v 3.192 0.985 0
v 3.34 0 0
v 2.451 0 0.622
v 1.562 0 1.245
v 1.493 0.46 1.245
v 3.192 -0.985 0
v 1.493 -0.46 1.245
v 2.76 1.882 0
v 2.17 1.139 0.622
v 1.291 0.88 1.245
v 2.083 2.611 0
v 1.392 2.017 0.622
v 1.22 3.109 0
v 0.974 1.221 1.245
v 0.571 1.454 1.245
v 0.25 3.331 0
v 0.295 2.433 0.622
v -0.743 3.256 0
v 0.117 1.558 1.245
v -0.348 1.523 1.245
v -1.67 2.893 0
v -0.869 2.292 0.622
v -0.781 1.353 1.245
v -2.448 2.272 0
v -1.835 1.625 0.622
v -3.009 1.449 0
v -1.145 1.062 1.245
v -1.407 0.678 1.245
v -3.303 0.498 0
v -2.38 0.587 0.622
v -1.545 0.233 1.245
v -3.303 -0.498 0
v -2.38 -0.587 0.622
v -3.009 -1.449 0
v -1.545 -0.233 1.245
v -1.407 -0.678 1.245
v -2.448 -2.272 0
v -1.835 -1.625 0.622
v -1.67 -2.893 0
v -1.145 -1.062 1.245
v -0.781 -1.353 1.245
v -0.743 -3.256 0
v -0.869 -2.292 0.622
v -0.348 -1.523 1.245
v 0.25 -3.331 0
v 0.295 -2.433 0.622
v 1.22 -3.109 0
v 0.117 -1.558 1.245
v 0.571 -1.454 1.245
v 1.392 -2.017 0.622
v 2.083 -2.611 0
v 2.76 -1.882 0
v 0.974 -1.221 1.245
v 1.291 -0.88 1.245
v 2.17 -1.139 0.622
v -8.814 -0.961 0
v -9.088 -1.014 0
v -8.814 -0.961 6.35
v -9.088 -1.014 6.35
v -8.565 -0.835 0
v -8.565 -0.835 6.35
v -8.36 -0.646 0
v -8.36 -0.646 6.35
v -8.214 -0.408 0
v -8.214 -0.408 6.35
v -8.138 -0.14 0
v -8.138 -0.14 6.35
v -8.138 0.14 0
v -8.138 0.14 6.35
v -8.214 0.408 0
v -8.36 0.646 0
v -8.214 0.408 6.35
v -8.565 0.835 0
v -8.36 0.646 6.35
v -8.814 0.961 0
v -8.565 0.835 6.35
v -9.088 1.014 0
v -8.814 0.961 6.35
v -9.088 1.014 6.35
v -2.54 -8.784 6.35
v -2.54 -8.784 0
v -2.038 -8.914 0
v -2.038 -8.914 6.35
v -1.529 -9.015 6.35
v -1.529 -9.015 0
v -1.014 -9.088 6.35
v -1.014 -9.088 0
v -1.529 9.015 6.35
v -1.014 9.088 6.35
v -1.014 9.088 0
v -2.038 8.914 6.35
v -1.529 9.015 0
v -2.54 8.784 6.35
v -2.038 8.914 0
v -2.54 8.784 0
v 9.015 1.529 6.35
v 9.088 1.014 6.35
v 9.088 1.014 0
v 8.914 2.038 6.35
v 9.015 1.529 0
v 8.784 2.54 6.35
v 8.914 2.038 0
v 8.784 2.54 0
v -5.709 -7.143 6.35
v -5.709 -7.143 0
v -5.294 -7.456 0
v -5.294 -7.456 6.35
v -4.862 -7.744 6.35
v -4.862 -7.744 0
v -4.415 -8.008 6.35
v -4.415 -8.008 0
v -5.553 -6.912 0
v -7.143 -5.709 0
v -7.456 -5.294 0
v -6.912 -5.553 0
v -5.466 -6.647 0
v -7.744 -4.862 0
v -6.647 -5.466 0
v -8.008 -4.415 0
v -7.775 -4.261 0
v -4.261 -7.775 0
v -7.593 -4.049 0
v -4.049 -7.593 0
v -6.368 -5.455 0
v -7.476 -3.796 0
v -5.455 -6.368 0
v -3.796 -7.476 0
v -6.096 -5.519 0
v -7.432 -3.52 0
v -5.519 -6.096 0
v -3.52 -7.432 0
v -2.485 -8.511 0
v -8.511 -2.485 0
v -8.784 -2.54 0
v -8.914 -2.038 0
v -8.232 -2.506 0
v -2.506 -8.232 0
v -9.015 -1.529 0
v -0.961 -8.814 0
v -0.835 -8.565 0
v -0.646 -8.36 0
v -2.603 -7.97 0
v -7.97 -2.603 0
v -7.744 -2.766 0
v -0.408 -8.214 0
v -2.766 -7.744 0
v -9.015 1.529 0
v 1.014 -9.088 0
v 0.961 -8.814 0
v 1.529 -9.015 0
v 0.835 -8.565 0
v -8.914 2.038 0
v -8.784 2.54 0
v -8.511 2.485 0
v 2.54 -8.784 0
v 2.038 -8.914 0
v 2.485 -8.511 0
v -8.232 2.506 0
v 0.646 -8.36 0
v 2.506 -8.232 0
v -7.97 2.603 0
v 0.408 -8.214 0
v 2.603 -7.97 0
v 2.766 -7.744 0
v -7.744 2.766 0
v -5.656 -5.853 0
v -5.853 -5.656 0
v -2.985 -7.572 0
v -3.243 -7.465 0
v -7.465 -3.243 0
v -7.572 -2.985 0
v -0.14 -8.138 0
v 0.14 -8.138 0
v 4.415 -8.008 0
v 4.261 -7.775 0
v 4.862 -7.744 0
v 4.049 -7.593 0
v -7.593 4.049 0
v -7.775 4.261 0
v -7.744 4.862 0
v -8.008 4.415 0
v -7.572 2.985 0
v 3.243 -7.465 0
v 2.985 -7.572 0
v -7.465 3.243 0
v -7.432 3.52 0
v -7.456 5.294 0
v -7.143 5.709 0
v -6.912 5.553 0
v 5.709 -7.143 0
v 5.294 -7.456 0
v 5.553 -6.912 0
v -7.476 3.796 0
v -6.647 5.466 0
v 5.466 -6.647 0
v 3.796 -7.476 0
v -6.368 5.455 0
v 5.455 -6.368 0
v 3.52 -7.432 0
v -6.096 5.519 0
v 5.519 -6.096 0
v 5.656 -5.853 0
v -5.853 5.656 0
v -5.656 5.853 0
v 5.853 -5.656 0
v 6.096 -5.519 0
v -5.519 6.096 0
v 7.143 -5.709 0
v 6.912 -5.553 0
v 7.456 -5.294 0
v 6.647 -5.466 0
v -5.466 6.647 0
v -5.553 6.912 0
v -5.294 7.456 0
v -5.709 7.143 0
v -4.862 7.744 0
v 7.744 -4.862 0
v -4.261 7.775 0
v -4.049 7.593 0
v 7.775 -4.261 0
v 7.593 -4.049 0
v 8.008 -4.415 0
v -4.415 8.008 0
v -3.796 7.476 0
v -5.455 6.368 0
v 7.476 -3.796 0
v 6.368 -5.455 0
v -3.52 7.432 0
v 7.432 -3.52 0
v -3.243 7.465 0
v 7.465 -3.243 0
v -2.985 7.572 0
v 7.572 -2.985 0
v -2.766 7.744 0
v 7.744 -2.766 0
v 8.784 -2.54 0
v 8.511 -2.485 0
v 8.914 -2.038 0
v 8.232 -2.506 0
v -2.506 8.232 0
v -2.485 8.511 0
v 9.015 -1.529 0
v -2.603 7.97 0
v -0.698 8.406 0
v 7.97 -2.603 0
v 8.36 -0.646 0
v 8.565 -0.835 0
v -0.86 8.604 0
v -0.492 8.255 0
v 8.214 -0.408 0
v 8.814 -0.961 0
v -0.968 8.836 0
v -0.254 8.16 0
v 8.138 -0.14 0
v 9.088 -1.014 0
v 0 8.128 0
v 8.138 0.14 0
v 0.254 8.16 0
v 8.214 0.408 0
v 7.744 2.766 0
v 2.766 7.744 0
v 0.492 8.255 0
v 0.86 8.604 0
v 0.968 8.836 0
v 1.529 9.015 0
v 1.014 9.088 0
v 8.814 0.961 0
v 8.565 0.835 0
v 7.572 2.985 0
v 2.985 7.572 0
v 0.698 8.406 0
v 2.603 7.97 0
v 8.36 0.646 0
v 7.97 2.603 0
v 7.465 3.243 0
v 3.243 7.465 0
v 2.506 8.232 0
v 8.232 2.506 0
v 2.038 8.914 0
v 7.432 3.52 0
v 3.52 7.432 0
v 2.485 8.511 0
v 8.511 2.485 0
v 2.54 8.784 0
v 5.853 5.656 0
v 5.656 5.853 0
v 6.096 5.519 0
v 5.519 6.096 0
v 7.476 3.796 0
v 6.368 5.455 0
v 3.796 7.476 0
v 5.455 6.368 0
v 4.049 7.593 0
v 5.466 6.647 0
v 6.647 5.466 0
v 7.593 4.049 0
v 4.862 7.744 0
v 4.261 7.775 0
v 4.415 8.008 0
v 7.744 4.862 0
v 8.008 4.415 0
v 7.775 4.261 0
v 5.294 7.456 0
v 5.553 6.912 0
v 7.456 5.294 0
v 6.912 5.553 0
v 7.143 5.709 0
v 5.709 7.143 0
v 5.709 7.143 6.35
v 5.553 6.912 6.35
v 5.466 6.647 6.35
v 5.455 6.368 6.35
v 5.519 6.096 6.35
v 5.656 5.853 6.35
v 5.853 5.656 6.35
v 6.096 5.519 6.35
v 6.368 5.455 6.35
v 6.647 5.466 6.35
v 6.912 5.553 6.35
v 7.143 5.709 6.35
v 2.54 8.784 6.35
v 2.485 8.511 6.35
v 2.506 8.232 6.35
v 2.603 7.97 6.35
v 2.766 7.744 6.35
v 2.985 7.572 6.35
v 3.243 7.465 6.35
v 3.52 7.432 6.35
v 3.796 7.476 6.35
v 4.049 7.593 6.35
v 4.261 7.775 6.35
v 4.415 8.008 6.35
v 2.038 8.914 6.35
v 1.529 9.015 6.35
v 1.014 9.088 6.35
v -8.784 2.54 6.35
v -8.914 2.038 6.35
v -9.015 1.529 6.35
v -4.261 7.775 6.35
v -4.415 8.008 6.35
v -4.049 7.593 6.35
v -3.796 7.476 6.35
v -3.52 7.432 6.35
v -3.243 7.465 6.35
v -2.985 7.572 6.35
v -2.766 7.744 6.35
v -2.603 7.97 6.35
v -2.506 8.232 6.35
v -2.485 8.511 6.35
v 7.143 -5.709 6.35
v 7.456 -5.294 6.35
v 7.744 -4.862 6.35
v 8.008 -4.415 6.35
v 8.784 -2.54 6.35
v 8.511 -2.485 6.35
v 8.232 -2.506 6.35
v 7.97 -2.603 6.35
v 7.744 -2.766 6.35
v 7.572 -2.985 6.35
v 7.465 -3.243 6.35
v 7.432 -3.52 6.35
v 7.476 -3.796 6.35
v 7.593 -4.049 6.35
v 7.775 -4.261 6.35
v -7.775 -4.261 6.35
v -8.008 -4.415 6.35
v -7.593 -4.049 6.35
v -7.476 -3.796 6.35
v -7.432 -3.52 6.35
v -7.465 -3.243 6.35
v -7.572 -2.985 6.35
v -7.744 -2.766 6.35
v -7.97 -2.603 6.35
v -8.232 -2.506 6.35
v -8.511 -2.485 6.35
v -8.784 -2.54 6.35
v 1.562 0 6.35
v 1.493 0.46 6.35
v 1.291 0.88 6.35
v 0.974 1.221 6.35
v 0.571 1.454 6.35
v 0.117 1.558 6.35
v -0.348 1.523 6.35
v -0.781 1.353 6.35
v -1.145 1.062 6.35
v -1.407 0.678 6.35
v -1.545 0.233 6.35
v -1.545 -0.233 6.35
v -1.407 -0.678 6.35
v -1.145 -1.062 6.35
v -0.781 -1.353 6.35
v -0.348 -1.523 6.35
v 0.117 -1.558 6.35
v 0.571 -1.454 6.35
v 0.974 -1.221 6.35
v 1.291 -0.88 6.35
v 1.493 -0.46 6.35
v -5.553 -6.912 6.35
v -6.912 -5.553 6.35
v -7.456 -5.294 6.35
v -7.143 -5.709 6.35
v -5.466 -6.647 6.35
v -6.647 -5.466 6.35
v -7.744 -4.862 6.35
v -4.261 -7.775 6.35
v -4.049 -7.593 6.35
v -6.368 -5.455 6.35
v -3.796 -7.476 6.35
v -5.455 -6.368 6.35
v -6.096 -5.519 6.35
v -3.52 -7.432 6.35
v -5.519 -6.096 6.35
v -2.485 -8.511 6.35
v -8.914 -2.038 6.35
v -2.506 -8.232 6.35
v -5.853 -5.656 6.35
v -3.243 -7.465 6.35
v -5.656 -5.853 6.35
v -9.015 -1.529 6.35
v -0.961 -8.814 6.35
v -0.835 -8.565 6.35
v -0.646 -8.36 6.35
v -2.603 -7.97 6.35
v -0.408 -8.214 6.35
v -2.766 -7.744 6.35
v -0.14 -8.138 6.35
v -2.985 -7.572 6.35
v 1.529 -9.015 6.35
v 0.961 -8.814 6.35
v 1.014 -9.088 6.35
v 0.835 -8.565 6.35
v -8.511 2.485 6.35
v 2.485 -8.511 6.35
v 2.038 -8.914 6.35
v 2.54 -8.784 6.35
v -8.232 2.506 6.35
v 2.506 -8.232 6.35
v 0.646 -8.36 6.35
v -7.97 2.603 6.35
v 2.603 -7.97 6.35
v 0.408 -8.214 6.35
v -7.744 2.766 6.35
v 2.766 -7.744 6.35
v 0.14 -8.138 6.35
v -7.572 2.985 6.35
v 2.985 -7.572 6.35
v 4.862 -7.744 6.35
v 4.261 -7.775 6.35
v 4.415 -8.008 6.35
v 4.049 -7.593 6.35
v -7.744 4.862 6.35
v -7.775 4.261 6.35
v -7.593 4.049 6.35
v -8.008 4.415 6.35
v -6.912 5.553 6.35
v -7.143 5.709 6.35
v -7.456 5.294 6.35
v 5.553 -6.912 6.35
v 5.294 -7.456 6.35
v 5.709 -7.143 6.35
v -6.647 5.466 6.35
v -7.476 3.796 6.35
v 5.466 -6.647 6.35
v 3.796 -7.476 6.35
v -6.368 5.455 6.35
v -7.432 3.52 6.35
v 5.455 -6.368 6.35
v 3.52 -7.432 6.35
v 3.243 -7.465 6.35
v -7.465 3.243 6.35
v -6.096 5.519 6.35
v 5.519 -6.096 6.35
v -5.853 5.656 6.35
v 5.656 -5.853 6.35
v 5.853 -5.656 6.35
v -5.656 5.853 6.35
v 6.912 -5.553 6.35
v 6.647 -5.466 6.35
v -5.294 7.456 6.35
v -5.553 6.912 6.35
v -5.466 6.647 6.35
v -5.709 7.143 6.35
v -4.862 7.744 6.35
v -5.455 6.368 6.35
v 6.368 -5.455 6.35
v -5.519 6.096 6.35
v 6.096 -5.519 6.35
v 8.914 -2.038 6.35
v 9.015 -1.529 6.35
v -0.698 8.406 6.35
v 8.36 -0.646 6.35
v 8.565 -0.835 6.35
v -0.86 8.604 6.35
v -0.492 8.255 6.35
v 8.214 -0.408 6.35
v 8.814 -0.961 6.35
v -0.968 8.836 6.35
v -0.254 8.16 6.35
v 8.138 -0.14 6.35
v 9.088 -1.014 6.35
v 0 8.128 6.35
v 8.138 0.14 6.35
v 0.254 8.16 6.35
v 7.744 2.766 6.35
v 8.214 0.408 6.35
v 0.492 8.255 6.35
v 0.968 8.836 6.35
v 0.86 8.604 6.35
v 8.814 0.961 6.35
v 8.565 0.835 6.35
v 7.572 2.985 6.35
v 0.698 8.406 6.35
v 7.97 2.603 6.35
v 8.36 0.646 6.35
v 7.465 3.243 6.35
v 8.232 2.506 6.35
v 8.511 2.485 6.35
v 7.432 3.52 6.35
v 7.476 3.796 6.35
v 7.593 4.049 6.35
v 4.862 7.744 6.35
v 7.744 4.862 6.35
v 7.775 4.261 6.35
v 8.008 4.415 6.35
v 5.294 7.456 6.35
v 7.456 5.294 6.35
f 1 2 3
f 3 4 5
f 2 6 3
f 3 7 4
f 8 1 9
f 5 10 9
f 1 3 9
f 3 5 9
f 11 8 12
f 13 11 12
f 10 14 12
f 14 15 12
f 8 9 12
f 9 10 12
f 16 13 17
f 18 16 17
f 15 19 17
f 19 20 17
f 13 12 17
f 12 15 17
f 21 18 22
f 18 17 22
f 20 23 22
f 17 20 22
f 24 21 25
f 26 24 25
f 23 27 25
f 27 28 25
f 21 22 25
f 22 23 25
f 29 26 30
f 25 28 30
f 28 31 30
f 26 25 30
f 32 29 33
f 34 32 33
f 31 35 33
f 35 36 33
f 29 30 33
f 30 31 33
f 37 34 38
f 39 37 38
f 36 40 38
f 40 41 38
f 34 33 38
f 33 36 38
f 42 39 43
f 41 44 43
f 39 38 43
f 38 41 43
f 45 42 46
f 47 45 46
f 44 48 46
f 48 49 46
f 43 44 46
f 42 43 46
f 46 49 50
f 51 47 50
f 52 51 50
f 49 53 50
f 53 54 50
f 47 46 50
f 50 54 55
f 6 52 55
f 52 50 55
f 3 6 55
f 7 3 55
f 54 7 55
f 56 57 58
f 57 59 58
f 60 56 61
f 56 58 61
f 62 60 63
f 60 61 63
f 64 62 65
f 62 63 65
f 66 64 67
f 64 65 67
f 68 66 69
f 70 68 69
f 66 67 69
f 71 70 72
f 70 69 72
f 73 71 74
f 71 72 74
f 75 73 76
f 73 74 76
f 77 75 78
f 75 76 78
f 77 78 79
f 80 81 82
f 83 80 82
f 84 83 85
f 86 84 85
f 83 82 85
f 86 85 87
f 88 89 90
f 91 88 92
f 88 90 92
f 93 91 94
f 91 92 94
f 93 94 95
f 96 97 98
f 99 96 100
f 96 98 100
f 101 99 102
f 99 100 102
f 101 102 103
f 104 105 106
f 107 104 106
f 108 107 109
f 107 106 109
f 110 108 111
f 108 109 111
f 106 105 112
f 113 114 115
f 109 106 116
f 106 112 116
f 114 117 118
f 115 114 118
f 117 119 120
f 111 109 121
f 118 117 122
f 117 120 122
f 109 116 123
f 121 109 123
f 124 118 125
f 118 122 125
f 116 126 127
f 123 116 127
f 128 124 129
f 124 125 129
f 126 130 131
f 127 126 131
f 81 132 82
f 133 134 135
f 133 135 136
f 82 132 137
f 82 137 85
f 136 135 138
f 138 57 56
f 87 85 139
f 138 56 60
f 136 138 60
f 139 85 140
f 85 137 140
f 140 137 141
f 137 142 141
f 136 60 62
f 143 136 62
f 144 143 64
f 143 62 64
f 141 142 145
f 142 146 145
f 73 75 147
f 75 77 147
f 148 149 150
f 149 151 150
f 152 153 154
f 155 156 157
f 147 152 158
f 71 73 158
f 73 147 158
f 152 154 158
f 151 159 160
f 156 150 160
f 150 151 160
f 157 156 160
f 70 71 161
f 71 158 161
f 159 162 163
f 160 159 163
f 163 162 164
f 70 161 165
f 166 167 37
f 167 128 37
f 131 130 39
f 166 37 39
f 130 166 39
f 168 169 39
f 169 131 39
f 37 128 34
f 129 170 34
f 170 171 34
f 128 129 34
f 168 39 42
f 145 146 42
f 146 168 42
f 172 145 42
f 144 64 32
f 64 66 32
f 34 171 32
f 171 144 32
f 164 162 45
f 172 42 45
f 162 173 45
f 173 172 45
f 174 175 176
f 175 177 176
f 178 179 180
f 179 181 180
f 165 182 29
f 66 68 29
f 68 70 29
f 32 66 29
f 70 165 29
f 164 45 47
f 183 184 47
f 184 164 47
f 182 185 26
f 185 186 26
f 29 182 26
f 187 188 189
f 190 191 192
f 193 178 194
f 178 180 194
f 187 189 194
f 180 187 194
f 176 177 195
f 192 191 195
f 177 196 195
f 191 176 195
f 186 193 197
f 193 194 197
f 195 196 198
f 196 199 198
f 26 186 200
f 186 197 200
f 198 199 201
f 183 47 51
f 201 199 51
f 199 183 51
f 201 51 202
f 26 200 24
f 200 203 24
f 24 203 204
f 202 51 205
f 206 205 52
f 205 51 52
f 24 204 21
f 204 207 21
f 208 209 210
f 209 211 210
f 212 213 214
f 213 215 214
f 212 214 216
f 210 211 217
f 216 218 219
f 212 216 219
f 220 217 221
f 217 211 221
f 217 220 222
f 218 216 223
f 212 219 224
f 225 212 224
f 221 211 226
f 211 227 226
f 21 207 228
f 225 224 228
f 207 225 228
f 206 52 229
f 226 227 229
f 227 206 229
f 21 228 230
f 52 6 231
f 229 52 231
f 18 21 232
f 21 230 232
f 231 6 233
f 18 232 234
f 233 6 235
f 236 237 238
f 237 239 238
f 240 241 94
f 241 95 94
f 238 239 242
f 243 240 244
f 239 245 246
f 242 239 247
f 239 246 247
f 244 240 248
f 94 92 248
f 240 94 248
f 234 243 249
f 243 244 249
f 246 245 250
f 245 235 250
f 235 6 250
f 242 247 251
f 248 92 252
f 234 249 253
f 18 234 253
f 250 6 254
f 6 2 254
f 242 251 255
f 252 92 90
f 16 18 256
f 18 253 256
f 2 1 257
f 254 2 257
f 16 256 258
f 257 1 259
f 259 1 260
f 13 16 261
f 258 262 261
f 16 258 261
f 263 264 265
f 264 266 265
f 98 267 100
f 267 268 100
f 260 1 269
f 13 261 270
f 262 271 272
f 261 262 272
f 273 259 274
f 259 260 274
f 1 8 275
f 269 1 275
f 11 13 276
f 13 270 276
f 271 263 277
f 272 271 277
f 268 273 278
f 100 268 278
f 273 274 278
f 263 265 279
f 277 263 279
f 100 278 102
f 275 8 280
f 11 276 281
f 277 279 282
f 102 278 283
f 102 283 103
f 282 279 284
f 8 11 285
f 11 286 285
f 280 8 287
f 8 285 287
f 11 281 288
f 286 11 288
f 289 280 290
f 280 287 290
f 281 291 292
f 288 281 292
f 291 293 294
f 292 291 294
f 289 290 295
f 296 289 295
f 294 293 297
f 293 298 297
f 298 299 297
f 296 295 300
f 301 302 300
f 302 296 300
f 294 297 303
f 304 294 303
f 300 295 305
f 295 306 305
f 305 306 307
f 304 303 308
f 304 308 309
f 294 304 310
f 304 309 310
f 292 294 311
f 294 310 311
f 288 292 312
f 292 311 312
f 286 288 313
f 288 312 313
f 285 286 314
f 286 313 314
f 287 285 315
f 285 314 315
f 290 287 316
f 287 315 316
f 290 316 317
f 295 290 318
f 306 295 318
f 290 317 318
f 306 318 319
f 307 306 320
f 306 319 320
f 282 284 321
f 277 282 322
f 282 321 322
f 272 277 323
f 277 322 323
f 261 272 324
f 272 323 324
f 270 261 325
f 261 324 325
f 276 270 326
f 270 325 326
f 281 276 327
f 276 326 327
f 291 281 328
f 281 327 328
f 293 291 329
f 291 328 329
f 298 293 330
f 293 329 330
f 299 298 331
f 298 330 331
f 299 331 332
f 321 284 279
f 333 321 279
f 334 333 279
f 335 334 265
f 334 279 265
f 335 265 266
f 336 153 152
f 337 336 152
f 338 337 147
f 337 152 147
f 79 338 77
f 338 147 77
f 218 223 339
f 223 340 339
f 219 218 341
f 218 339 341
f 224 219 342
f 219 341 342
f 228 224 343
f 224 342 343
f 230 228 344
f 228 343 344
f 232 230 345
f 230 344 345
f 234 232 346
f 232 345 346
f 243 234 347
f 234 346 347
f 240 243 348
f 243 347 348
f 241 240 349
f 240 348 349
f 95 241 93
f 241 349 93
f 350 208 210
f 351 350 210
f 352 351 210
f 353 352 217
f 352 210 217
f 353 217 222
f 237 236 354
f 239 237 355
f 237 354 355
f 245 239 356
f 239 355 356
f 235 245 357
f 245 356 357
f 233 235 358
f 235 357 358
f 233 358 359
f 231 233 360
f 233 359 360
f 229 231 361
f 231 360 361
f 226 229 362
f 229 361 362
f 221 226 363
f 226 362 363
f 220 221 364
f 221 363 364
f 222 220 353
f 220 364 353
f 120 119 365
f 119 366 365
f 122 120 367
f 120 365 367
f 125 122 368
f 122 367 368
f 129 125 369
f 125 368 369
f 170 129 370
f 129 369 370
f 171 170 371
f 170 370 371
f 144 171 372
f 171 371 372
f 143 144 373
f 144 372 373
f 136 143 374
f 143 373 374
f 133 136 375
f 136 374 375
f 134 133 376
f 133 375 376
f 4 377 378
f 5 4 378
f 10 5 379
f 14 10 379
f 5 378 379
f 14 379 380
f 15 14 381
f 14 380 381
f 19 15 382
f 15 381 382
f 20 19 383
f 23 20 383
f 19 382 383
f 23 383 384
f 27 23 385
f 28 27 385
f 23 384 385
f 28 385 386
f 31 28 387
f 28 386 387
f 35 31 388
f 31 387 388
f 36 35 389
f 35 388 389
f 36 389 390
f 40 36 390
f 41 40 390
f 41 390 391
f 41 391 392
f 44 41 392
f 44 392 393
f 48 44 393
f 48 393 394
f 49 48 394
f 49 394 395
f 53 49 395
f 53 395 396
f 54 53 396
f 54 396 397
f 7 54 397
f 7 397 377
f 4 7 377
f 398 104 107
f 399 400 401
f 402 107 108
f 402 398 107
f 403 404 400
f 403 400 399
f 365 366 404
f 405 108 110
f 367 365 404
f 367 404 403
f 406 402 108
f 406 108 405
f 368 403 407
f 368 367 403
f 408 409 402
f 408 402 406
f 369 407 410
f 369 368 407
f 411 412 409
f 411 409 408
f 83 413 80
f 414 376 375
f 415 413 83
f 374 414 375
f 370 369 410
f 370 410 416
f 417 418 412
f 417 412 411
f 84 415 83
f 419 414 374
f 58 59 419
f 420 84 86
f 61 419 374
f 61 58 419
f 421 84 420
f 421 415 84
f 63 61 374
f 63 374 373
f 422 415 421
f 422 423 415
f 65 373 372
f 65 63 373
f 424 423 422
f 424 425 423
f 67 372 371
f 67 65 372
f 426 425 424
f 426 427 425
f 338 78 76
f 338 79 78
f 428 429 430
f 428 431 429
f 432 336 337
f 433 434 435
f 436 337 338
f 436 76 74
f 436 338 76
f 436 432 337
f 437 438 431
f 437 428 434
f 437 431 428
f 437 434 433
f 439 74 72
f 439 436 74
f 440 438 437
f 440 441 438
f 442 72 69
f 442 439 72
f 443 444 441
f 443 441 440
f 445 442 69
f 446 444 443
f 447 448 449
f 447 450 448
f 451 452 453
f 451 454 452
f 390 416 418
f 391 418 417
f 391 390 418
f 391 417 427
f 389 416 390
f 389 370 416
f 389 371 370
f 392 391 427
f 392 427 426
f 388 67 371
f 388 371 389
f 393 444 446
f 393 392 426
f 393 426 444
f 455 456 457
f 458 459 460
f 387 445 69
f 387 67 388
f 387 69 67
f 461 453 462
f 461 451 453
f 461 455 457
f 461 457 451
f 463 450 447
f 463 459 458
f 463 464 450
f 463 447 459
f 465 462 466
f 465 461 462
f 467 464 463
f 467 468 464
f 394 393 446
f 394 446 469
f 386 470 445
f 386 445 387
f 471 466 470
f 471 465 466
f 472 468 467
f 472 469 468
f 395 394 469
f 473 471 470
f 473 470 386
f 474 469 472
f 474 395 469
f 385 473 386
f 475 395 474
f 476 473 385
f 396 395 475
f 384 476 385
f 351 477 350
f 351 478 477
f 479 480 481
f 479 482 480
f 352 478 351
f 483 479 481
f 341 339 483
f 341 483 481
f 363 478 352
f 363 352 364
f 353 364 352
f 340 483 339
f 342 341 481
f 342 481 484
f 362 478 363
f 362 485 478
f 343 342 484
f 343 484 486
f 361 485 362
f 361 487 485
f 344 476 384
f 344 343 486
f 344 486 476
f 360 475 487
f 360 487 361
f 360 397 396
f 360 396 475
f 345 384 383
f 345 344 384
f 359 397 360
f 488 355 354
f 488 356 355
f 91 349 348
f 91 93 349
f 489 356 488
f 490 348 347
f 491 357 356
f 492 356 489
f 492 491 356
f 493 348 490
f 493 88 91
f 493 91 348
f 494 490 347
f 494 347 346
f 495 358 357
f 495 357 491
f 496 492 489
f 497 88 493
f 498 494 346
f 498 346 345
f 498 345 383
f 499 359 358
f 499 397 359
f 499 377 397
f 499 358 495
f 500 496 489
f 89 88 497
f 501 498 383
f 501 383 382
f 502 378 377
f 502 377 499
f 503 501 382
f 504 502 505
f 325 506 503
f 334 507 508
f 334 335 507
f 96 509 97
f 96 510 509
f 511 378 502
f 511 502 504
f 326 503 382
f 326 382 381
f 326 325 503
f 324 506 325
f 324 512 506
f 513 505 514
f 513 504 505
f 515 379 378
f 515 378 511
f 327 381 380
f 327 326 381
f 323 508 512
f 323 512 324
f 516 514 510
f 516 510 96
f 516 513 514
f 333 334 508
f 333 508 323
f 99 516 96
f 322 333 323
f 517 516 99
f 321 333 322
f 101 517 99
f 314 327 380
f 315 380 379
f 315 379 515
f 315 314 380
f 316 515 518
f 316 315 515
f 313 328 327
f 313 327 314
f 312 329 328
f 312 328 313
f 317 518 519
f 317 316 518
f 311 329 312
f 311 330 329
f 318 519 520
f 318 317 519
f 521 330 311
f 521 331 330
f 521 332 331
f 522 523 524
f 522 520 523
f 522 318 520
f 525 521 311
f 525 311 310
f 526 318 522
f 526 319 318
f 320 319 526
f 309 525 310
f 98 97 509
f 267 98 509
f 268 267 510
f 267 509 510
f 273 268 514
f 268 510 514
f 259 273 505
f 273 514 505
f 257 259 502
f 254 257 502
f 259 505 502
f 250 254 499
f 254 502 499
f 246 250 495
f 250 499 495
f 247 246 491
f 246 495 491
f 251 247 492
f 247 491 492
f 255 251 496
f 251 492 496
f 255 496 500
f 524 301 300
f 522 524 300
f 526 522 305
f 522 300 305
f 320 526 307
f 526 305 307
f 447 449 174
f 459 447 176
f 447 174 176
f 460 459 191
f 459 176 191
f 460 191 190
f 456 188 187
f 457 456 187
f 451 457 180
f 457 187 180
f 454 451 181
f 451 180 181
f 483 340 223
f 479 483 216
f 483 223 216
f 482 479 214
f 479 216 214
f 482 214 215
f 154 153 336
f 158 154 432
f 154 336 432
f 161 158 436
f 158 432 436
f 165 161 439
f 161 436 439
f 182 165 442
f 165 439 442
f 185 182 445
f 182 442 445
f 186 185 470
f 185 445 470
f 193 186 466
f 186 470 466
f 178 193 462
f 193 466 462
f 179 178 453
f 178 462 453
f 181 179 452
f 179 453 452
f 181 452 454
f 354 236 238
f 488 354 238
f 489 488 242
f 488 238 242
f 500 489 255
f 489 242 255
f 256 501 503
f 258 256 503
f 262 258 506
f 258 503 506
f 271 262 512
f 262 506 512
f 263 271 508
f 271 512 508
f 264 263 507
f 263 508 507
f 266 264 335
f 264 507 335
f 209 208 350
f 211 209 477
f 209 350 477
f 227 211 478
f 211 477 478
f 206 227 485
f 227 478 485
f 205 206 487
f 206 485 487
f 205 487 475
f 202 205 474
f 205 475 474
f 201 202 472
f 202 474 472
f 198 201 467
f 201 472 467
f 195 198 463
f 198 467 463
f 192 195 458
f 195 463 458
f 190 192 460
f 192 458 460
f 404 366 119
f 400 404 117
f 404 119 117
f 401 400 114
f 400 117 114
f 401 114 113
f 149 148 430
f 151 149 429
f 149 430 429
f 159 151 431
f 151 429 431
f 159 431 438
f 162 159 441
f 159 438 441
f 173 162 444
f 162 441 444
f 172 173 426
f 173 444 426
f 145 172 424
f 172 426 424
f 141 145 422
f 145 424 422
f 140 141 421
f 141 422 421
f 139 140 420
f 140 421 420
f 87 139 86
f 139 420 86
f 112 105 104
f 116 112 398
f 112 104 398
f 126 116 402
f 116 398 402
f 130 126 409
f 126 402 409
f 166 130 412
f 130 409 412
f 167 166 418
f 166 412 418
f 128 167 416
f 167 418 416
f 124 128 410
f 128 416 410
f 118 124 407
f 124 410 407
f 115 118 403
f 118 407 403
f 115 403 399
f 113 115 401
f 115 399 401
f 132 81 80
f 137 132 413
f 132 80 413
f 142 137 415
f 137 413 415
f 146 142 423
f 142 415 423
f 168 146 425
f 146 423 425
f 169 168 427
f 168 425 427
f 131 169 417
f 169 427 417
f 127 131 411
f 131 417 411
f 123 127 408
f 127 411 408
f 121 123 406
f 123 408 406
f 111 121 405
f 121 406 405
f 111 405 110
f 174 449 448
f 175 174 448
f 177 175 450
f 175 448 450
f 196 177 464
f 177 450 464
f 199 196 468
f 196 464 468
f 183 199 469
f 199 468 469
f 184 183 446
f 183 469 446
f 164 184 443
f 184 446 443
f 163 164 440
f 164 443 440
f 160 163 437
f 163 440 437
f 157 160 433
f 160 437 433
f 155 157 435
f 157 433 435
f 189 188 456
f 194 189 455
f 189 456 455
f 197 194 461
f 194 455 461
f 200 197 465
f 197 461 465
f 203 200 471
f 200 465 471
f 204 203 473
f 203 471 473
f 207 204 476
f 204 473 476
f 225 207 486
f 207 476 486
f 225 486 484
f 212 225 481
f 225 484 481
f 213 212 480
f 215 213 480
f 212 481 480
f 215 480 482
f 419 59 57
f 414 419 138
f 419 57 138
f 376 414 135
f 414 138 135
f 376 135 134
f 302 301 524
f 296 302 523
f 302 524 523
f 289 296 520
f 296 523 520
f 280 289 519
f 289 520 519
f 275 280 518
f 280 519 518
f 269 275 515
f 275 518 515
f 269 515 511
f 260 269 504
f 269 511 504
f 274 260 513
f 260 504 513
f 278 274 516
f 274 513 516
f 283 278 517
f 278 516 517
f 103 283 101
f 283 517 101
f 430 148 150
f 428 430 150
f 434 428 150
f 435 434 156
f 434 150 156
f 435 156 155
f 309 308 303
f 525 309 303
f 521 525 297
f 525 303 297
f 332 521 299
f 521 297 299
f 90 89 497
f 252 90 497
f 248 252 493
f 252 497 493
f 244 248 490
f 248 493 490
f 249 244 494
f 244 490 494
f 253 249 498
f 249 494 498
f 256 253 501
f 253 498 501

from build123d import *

# Parameters (mm, degrees)
F0_R     = 9.144
F1_DEPTH = 6.35
F2_R     = 1.5621
F3_DEPTH = 6.351
F4_SIZE2 = 1.244969
F4_SIZE  = 1.778
F5_R     = 1.016
F6_DEPTH = 6.351


with BuildPart() as f1:
    # F0 (on Top) → F1 (new body)
    with BuildSketch(Plane.XY):
        Circle(F0_R)
    extrude(amount=F1_DEPTH)

    # F2 (on face) → F3 (cut, through all)
    with BuildSketch(Plane.XY.offset(6.35)):
        Circle(F2_R)
    extrude(amount=-F3_DEPTH, mode=Mode.SUBTRACT)

    # F4
    f4_edges = [f1.edges().sort_by_distance(p)[0] for p in [
        (-1.5621, 0, 0),
    ]]
    chamfer(f4_edges, length=F4_SIZE, length2=F4_SIZE2)

    # F5 (on face) → F6 (cut, through all)
    with BuildSketch(Plane.XY.offset(6.35)):
        with BuildLine():
            ThreePointArc((0, 8.128), (0.71842, 8.42558), (1.016, 9.144))
            ThreePointArc((1.016, 9.144), (-0.71842, 9.86242), (0, 8.128))
        make_face()
        with Locations((-3.499257, 8.447954)):
            Circle(F5_R)
        with Locations((-6.465784, 6.465784)):
            Circle(F5_R)
        with Locations((-8.447954, 3.499257)):
            Circle(F5_R)
        with Locations((-9.144, 0)):
            Circle(F5_R)
        with Locations((-8.447954, -3.499257)):
            Circle(F5_R)
        with Locations((-6.465784, -6.465784)):
            Circle(F5_R)
        with Locations((-3.499257, -8.447954)):
            Circle(F5_R)
        with Locations((0, -9.144)):
            Circle(F5_R)
        with Locations((3.499257, -8.447954)):
            Circle(F5_R)
        with Locations((6.465784, -6.465784)):
            Circle(F5_R)
        with Locations((8.447954, -3.499257)):
            Circle(F5_R)
        with Locations((9.144, 0)):
            Circle(F5_R)
        with Locations((8.447954, 3.499257)):
            Circle(F5_R)
        with Locations((6.465784, 6.465784)):
            Circle(F5_R)
        with Locations((3.499257, 8.447954)):
            Circle(F5_R)
    extrude(amount=-F6_DEPTH, mode=Mode.SUBTRACT)


solid = f1.part
